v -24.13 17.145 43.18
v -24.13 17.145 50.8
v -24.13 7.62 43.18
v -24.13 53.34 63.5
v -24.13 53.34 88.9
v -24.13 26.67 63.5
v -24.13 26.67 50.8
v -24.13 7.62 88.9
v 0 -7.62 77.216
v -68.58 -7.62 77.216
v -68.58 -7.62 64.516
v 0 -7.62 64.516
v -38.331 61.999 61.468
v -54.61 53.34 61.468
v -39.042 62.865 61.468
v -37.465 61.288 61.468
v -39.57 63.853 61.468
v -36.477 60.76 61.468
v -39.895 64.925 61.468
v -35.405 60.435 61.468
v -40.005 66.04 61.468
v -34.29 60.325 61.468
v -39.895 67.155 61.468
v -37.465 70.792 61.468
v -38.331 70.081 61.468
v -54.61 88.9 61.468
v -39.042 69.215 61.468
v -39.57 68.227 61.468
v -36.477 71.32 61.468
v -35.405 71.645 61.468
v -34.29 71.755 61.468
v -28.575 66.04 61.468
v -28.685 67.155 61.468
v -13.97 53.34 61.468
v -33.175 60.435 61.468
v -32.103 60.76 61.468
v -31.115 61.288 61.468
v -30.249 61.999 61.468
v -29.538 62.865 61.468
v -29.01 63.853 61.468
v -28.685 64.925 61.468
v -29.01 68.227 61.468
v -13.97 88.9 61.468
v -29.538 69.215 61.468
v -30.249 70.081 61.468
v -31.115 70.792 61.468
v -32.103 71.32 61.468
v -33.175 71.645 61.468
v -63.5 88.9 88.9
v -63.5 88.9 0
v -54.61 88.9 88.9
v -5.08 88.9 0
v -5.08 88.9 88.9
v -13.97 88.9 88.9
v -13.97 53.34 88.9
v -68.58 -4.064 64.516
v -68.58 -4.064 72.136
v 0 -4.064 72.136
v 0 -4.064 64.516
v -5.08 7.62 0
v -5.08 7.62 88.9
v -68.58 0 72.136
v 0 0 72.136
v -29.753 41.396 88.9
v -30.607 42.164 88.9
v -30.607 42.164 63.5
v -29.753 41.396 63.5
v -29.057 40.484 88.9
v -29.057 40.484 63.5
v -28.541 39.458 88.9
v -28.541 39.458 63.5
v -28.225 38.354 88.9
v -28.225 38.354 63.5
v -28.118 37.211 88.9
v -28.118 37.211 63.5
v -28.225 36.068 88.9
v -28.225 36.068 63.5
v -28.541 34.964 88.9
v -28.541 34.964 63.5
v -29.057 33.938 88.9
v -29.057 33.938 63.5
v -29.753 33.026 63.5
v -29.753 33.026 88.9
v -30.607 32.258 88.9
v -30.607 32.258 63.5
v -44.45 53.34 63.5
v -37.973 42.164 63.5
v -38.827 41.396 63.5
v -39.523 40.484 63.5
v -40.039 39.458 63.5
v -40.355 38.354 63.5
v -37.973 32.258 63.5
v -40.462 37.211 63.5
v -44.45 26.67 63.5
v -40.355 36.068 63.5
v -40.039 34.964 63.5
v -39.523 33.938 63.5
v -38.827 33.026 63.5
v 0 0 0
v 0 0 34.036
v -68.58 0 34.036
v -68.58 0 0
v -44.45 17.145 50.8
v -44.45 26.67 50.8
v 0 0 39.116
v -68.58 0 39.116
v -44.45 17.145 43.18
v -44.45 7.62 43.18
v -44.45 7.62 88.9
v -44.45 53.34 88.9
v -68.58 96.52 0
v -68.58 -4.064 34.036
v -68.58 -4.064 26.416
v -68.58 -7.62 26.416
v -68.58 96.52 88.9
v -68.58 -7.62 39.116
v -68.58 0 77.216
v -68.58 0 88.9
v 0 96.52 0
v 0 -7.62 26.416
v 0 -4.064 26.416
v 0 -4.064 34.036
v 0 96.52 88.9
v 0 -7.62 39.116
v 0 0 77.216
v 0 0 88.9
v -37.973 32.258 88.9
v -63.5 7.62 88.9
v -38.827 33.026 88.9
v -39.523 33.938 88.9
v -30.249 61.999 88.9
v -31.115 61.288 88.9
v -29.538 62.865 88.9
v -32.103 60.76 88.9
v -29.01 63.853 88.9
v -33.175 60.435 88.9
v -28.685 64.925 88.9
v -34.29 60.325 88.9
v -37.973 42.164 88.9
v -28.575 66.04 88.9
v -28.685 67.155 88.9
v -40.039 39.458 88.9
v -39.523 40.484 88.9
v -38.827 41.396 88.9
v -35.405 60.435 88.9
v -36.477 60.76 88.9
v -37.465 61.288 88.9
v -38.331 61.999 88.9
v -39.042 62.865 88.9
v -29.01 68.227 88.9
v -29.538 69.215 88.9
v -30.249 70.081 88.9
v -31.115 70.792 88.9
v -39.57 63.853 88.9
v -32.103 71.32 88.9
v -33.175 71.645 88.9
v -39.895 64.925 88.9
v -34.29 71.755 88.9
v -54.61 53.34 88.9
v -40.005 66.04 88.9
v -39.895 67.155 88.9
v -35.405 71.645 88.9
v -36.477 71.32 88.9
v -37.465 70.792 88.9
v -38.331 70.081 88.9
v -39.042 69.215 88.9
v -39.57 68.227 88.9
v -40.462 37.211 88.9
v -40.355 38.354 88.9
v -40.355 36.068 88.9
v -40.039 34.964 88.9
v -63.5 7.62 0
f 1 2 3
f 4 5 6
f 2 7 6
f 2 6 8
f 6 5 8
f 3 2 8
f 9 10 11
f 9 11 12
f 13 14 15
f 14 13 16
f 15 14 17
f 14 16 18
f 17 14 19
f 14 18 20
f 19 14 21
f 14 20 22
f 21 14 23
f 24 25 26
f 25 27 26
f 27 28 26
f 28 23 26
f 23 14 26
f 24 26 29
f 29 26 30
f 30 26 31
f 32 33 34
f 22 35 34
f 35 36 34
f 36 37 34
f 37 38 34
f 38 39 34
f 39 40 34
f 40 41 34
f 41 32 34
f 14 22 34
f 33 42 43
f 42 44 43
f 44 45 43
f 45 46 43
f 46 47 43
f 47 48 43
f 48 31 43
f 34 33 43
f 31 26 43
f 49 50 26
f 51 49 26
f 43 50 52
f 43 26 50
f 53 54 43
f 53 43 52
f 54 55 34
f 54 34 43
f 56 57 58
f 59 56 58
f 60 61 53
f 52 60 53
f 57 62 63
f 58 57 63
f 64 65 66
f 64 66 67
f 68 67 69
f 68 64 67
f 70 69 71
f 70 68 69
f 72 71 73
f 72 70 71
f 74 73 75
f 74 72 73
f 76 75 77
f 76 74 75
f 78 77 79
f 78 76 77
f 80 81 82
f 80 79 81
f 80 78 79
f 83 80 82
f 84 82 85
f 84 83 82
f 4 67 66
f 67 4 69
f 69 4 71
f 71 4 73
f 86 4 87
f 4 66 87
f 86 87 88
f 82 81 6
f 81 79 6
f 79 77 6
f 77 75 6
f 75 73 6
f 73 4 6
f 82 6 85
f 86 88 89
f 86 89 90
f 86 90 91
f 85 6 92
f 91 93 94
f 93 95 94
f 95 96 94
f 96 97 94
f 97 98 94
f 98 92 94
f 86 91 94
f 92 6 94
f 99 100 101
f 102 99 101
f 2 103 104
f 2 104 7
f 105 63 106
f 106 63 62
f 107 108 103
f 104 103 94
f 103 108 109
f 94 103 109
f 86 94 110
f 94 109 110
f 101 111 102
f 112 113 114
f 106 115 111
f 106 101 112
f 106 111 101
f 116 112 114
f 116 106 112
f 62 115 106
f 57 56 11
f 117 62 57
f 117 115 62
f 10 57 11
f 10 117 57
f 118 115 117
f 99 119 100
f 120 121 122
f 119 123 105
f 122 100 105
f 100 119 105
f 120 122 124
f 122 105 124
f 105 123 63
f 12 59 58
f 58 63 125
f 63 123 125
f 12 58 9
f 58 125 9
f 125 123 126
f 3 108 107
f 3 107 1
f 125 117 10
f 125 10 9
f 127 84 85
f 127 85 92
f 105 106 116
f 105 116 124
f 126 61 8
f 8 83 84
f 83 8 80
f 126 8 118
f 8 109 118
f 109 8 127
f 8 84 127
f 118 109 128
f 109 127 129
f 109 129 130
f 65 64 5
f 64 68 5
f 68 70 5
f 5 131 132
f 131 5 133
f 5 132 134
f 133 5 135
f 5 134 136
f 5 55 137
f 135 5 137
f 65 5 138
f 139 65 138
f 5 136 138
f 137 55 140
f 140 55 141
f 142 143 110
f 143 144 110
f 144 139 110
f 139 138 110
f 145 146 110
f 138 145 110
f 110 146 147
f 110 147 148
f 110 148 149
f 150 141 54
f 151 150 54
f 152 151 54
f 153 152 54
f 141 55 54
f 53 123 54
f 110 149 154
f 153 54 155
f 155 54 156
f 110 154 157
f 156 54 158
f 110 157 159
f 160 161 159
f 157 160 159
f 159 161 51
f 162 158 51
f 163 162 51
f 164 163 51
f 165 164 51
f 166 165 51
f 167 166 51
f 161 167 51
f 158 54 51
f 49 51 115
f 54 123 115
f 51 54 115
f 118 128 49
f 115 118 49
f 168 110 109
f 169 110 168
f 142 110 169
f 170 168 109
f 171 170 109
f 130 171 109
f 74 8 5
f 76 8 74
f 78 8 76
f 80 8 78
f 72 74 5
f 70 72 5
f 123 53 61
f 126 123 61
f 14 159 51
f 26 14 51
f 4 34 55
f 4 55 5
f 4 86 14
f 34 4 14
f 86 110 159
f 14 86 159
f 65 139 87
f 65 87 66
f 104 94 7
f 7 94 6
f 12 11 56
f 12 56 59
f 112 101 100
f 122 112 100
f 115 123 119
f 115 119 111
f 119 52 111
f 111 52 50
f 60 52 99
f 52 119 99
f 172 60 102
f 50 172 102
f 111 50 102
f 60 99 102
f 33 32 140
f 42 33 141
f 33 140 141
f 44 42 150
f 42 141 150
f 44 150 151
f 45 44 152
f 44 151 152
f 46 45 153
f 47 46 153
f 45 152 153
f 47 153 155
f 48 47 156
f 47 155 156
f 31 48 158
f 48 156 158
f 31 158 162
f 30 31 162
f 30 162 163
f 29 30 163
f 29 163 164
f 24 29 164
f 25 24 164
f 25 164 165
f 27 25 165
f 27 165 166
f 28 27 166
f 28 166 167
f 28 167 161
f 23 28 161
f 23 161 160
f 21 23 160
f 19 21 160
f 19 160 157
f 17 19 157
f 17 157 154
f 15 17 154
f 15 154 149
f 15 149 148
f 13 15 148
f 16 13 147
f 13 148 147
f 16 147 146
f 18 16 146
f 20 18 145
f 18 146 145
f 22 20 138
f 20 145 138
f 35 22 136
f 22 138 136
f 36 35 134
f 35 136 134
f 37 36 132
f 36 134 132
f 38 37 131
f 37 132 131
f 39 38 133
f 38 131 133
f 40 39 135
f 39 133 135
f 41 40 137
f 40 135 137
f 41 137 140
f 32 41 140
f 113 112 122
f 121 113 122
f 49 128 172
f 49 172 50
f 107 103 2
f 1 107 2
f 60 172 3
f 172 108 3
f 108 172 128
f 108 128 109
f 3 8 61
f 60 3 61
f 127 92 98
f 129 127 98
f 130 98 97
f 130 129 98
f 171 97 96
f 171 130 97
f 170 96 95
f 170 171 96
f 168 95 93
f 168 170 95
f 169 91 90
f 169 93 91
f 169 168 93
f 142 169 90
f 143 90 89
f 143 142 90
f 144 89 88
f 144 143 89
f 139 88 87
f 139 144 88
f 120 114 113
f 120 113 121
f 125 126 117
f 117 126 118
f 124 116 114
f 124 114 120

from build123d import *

# Parameters (mm, degrees)
SKETCH1_W            = 68.58
SKETCH1_H            = 88.9
BOSS_EXTRUDE1_DEPTH  = 96.52
SKETCH2_W            = 58.42
SKETCH2_H            = 81.28
CUT_EXTRUDE1_DEPTH   = 149.062611081
SKETCH3_W            = 20.32
SKETCH3_H            = 12.7
BOSS_EXTRUDE2_DEPTH  = 38.1
SKETCH4_W            = 20.32
SKETCH4_H            = 19.05
BOSS_EXTRUDE3_DEPTH  = 12.7
SKETCH5_W            = 20.32
SKETCH5_H            = 9.525
BOSS_EXTRUDE4_DEPTH  = 7.62
CUT_EXTRUDE2_DEPTH   = 141.804001364
SKETCH7_W            = 68.58
SKETCH7_H            = 5.08
BOSS_EXTRUDE5_DEPTH  = 7.62
SKETCH8_W            = 68.58
SKETCH8_H            = 3.556
BOSS_EXTRUDE6_DEPTH  = 7.62
SKETCH9_W            = 68.58
SKETCH9_H            = 3.556
BOSS_EXTRUDE7_DEPTH  = 7.62
SKETCH10_W           = 40.64
SKETCH10_H           = 12.7
BOSS_EXTRUDE8_DEPTH  = 35.56
SKETCH11_R           = 5.715
CUT_EXTRUDE3_DEPTH   = 140.7147774
BOSS_EXTRUDE9_START  = 2.032
SKETCH13_W           = 40.64
SKETCH13_H           = 35.56
SKETCH13_R           = 5.715
BOSS_EXTRUDE9_DEPTH  = 2.032
SKETCH15_W           = 20.32
SKETCH15_H           = 12.7
BOSS_EXTRUDE10_DEPTH = 7.62
BOSS_EXTRUDE11_START = 12.7
SKETCH16_R           = 5.715
BOSS_EXTRUDE11_DEPTH = 12.7


with BuildPart() as part:
    # Sketch1 → Boss-Extrude1 (new body)
    with BuildSketch(Plane(origin=(0, 0, 0), x_dir=(-1, 0, 0), z_dir=(0, 1, 0))):
        with Locations((34.29, 44.45)):
            Rectangle(SKETCH1_W, SKETCH1_H)
    extrude(amount=BOSS_EXTRUDE1_DEPTH)

    # Sketch2 → Cut-Extrude1 (cut, through all)
    with BuildSketch(Plane.XY.offset(88.9)):
        with Locations((-34.29, 48.26)):
            Rectangle(SKETCH2_W, SKETCH2_H)
    extrude(amount=-CUT_EXTRUDE1_DEPTH, mode=Mode.SUBTRACT)

    # Sketch3 → Boss-Extrude2 (add)
    with BuildSketch(Plane(origin=(0, 7.62, 0), x_dir=(-1, 0, 0), z_dir=(0, 1, 0))):
        with Locations((34.29, 69.85)):
            Rectangle(SKETCH3_W, SKETCH3_H)
    extrude(amount=BOSS_EXTRUDE2_DEPTH)

    # Sketch4 → Boss-Extrude3 (add)
    with BuildSketch(Plane(origin=(0, 0, 63.5), x_dir=(1, 0, 0), z_dir=(0, 0, -1))):
        with Locations((-34.29, -17.145)):
            Rectangle(SKETCH4_W, SKETCH4_H)
    extrude(amount=BOSS_EXTRUDE3_DEPTH)

    # Sketch5 → Boss-Extrude4 (add)
    with BuildSketch(Plane(origin=(0, 0, 50.8), x_dir=(1, 0, 0), z_dir=(0, 0, -1))):
        with Locations((-34.29, -12.3825)):
            Rectangle(SKETCH5_W, SKETCH5_H)
    extrude(amount=BOSS_EXTRUDE4_DEPTH)

    # Sketch6 → Cut-Extrude2 (cut, through all)
    with BuildSketch(Plane.XY.offset(76.2)):
        with BuildLine():
            Line((-37.973, 42.164), (-30.607, 42.164))
            ThreePointArc((-30.607, 42.164), (-28.117747737, 37.211), (-30.607, 32.258))
            Line((-30.607, 32.258), (-37.973, 32.258))
            ThreePointArc((-37.973, 32.258), (-40.462252263, 37.211), (-37.973, 42.164))
        make_face()
    extrude(amount=-CUT_EXTRUDE2_DEPTH, mode=Mode.SUBTRACT)

    # Sketch7 → Boss-Extrude5 (add)
    with BuildSketch(Plane.XZ):
        with Locations((-34.29, 74.676)):
            Rectangle(SKETCH7_W, SKETCH7_H)
        with Locations((-34.29, 36.576)):
            Rectangle(SKETCH7_W, SKETCH7_H)
    extrude(amount=BOSS_EXTRUDE5_DEPTH)

    # Sketch8 → Boss-Extrude6 (add)
    with BuildSketch(Plane(origin=(0, 0, 72.136), x_dir=(1, 0, 0), z_dir=(0, 0, -1))):
        with Locations((-34.29, 5.842)):
            Rectangle(SKETCH8_W, SKETCH8_H)
    extrude(amount=BOSS_EXTRUDE6_DEPTH)

    # Sketch9 → Boss-Extrude7 (add)
    with BuildSketch(Plane(origin=(0, 0, 34.036), x_dir=(1, 0, 0), z_dir=(0, 0, -1))):
        with Locations((-34.29, 5.842)):
            Rectangle(SKETCH9_W, SKETCH9_H)
    extrude(amount=BOSS_EXTRUDE7_DEPTH)

    # Sketch10 → Boss-Extrude8 (add)
    with BuildSketch(Plane.XZ.offset(-88.9)):
        with Locations((-34.29, 67.818)):
            Rectangle(SKETCH10_W, SKETCH10_H)
    extrude(amount=BOSS_EXTRUDE8_DEPTH)

    # Sketch11 → Cut-Extrude3 (cut, through all)
    with BuildSketch(Plane.XY.offset(74.168)):
        with Locations((-34.29, 66.04)):
            Circle(SKETCH11_R)
    extrude(amount=-CUT_EXTRUDE3_DEPTH, mode=Mode.SUBTRACT)

    # Sketch13 → Boss-Extrude9 (add)
    with BuildSketch(Plane.XY.offset(74.168).offset(BOSS_EXTRUDE9_START)):
        with Locations((-34.29, 71.12)):
            Rectangle(SKETCH13_W, SKETCH13_H)
        with Locations((-34.29, 66.04)):
            Circle(SKETCH13_R, mode=Mode.SUBTRACT)
    extrude(amount=-BOSS_EXTRUDE9_DEPTH)

    # Sketch15 → Boss-Extrude10 (add)
    with BuildSketch(Plane(origin=(0, 45.72, 0), x_dir=(-1, 0, 0), z_dir=(0, 1, 0))):
        with Locations((34.29, 69.85)):
            Rectangle(SKETCH15_W, SKETCH15_H)
    extrude(amount=BOSS_EXTRUDE10_DEPTH)

    # Sketch16 → Boss-Extrude11 (add)
    with BuildSketch(Plane.XY.offset(76.2).offset(BOSS_EXTRUDE11_START)):
        Polygon((-54.61, 88.9), (-13.97, 88.9), (-13.97, 53.34), (-24.13, 53.34), (-24.13, 7.62), (-44.45, 7.62), (-44.45, 53.34), (-54.61, 53.34), align=None)
        with Locations((-34.29, 66.04)):
            Circle(SKETCH16_R, mode=Mode.SUBTRACT)
        with BuildLine():
            Line((-37.973, 42.164), (-30.607, 42.164))
            ThreePointArc((-30.607, 42.164), (-28.117747737, 37.211), (-30.607, 32.258))
            Line((-30.607, 32.258), (-37.973, 32.258))
            ThreePointArc((-37.973, 32.258), (-40.462252263, 37.211), (-37.973, 42.164))
        make_face(mode=Mode.SUBTRACT)
    extrude(amount=-BOSS_EXTRUDE11_DEPTH)


solid = part.part
